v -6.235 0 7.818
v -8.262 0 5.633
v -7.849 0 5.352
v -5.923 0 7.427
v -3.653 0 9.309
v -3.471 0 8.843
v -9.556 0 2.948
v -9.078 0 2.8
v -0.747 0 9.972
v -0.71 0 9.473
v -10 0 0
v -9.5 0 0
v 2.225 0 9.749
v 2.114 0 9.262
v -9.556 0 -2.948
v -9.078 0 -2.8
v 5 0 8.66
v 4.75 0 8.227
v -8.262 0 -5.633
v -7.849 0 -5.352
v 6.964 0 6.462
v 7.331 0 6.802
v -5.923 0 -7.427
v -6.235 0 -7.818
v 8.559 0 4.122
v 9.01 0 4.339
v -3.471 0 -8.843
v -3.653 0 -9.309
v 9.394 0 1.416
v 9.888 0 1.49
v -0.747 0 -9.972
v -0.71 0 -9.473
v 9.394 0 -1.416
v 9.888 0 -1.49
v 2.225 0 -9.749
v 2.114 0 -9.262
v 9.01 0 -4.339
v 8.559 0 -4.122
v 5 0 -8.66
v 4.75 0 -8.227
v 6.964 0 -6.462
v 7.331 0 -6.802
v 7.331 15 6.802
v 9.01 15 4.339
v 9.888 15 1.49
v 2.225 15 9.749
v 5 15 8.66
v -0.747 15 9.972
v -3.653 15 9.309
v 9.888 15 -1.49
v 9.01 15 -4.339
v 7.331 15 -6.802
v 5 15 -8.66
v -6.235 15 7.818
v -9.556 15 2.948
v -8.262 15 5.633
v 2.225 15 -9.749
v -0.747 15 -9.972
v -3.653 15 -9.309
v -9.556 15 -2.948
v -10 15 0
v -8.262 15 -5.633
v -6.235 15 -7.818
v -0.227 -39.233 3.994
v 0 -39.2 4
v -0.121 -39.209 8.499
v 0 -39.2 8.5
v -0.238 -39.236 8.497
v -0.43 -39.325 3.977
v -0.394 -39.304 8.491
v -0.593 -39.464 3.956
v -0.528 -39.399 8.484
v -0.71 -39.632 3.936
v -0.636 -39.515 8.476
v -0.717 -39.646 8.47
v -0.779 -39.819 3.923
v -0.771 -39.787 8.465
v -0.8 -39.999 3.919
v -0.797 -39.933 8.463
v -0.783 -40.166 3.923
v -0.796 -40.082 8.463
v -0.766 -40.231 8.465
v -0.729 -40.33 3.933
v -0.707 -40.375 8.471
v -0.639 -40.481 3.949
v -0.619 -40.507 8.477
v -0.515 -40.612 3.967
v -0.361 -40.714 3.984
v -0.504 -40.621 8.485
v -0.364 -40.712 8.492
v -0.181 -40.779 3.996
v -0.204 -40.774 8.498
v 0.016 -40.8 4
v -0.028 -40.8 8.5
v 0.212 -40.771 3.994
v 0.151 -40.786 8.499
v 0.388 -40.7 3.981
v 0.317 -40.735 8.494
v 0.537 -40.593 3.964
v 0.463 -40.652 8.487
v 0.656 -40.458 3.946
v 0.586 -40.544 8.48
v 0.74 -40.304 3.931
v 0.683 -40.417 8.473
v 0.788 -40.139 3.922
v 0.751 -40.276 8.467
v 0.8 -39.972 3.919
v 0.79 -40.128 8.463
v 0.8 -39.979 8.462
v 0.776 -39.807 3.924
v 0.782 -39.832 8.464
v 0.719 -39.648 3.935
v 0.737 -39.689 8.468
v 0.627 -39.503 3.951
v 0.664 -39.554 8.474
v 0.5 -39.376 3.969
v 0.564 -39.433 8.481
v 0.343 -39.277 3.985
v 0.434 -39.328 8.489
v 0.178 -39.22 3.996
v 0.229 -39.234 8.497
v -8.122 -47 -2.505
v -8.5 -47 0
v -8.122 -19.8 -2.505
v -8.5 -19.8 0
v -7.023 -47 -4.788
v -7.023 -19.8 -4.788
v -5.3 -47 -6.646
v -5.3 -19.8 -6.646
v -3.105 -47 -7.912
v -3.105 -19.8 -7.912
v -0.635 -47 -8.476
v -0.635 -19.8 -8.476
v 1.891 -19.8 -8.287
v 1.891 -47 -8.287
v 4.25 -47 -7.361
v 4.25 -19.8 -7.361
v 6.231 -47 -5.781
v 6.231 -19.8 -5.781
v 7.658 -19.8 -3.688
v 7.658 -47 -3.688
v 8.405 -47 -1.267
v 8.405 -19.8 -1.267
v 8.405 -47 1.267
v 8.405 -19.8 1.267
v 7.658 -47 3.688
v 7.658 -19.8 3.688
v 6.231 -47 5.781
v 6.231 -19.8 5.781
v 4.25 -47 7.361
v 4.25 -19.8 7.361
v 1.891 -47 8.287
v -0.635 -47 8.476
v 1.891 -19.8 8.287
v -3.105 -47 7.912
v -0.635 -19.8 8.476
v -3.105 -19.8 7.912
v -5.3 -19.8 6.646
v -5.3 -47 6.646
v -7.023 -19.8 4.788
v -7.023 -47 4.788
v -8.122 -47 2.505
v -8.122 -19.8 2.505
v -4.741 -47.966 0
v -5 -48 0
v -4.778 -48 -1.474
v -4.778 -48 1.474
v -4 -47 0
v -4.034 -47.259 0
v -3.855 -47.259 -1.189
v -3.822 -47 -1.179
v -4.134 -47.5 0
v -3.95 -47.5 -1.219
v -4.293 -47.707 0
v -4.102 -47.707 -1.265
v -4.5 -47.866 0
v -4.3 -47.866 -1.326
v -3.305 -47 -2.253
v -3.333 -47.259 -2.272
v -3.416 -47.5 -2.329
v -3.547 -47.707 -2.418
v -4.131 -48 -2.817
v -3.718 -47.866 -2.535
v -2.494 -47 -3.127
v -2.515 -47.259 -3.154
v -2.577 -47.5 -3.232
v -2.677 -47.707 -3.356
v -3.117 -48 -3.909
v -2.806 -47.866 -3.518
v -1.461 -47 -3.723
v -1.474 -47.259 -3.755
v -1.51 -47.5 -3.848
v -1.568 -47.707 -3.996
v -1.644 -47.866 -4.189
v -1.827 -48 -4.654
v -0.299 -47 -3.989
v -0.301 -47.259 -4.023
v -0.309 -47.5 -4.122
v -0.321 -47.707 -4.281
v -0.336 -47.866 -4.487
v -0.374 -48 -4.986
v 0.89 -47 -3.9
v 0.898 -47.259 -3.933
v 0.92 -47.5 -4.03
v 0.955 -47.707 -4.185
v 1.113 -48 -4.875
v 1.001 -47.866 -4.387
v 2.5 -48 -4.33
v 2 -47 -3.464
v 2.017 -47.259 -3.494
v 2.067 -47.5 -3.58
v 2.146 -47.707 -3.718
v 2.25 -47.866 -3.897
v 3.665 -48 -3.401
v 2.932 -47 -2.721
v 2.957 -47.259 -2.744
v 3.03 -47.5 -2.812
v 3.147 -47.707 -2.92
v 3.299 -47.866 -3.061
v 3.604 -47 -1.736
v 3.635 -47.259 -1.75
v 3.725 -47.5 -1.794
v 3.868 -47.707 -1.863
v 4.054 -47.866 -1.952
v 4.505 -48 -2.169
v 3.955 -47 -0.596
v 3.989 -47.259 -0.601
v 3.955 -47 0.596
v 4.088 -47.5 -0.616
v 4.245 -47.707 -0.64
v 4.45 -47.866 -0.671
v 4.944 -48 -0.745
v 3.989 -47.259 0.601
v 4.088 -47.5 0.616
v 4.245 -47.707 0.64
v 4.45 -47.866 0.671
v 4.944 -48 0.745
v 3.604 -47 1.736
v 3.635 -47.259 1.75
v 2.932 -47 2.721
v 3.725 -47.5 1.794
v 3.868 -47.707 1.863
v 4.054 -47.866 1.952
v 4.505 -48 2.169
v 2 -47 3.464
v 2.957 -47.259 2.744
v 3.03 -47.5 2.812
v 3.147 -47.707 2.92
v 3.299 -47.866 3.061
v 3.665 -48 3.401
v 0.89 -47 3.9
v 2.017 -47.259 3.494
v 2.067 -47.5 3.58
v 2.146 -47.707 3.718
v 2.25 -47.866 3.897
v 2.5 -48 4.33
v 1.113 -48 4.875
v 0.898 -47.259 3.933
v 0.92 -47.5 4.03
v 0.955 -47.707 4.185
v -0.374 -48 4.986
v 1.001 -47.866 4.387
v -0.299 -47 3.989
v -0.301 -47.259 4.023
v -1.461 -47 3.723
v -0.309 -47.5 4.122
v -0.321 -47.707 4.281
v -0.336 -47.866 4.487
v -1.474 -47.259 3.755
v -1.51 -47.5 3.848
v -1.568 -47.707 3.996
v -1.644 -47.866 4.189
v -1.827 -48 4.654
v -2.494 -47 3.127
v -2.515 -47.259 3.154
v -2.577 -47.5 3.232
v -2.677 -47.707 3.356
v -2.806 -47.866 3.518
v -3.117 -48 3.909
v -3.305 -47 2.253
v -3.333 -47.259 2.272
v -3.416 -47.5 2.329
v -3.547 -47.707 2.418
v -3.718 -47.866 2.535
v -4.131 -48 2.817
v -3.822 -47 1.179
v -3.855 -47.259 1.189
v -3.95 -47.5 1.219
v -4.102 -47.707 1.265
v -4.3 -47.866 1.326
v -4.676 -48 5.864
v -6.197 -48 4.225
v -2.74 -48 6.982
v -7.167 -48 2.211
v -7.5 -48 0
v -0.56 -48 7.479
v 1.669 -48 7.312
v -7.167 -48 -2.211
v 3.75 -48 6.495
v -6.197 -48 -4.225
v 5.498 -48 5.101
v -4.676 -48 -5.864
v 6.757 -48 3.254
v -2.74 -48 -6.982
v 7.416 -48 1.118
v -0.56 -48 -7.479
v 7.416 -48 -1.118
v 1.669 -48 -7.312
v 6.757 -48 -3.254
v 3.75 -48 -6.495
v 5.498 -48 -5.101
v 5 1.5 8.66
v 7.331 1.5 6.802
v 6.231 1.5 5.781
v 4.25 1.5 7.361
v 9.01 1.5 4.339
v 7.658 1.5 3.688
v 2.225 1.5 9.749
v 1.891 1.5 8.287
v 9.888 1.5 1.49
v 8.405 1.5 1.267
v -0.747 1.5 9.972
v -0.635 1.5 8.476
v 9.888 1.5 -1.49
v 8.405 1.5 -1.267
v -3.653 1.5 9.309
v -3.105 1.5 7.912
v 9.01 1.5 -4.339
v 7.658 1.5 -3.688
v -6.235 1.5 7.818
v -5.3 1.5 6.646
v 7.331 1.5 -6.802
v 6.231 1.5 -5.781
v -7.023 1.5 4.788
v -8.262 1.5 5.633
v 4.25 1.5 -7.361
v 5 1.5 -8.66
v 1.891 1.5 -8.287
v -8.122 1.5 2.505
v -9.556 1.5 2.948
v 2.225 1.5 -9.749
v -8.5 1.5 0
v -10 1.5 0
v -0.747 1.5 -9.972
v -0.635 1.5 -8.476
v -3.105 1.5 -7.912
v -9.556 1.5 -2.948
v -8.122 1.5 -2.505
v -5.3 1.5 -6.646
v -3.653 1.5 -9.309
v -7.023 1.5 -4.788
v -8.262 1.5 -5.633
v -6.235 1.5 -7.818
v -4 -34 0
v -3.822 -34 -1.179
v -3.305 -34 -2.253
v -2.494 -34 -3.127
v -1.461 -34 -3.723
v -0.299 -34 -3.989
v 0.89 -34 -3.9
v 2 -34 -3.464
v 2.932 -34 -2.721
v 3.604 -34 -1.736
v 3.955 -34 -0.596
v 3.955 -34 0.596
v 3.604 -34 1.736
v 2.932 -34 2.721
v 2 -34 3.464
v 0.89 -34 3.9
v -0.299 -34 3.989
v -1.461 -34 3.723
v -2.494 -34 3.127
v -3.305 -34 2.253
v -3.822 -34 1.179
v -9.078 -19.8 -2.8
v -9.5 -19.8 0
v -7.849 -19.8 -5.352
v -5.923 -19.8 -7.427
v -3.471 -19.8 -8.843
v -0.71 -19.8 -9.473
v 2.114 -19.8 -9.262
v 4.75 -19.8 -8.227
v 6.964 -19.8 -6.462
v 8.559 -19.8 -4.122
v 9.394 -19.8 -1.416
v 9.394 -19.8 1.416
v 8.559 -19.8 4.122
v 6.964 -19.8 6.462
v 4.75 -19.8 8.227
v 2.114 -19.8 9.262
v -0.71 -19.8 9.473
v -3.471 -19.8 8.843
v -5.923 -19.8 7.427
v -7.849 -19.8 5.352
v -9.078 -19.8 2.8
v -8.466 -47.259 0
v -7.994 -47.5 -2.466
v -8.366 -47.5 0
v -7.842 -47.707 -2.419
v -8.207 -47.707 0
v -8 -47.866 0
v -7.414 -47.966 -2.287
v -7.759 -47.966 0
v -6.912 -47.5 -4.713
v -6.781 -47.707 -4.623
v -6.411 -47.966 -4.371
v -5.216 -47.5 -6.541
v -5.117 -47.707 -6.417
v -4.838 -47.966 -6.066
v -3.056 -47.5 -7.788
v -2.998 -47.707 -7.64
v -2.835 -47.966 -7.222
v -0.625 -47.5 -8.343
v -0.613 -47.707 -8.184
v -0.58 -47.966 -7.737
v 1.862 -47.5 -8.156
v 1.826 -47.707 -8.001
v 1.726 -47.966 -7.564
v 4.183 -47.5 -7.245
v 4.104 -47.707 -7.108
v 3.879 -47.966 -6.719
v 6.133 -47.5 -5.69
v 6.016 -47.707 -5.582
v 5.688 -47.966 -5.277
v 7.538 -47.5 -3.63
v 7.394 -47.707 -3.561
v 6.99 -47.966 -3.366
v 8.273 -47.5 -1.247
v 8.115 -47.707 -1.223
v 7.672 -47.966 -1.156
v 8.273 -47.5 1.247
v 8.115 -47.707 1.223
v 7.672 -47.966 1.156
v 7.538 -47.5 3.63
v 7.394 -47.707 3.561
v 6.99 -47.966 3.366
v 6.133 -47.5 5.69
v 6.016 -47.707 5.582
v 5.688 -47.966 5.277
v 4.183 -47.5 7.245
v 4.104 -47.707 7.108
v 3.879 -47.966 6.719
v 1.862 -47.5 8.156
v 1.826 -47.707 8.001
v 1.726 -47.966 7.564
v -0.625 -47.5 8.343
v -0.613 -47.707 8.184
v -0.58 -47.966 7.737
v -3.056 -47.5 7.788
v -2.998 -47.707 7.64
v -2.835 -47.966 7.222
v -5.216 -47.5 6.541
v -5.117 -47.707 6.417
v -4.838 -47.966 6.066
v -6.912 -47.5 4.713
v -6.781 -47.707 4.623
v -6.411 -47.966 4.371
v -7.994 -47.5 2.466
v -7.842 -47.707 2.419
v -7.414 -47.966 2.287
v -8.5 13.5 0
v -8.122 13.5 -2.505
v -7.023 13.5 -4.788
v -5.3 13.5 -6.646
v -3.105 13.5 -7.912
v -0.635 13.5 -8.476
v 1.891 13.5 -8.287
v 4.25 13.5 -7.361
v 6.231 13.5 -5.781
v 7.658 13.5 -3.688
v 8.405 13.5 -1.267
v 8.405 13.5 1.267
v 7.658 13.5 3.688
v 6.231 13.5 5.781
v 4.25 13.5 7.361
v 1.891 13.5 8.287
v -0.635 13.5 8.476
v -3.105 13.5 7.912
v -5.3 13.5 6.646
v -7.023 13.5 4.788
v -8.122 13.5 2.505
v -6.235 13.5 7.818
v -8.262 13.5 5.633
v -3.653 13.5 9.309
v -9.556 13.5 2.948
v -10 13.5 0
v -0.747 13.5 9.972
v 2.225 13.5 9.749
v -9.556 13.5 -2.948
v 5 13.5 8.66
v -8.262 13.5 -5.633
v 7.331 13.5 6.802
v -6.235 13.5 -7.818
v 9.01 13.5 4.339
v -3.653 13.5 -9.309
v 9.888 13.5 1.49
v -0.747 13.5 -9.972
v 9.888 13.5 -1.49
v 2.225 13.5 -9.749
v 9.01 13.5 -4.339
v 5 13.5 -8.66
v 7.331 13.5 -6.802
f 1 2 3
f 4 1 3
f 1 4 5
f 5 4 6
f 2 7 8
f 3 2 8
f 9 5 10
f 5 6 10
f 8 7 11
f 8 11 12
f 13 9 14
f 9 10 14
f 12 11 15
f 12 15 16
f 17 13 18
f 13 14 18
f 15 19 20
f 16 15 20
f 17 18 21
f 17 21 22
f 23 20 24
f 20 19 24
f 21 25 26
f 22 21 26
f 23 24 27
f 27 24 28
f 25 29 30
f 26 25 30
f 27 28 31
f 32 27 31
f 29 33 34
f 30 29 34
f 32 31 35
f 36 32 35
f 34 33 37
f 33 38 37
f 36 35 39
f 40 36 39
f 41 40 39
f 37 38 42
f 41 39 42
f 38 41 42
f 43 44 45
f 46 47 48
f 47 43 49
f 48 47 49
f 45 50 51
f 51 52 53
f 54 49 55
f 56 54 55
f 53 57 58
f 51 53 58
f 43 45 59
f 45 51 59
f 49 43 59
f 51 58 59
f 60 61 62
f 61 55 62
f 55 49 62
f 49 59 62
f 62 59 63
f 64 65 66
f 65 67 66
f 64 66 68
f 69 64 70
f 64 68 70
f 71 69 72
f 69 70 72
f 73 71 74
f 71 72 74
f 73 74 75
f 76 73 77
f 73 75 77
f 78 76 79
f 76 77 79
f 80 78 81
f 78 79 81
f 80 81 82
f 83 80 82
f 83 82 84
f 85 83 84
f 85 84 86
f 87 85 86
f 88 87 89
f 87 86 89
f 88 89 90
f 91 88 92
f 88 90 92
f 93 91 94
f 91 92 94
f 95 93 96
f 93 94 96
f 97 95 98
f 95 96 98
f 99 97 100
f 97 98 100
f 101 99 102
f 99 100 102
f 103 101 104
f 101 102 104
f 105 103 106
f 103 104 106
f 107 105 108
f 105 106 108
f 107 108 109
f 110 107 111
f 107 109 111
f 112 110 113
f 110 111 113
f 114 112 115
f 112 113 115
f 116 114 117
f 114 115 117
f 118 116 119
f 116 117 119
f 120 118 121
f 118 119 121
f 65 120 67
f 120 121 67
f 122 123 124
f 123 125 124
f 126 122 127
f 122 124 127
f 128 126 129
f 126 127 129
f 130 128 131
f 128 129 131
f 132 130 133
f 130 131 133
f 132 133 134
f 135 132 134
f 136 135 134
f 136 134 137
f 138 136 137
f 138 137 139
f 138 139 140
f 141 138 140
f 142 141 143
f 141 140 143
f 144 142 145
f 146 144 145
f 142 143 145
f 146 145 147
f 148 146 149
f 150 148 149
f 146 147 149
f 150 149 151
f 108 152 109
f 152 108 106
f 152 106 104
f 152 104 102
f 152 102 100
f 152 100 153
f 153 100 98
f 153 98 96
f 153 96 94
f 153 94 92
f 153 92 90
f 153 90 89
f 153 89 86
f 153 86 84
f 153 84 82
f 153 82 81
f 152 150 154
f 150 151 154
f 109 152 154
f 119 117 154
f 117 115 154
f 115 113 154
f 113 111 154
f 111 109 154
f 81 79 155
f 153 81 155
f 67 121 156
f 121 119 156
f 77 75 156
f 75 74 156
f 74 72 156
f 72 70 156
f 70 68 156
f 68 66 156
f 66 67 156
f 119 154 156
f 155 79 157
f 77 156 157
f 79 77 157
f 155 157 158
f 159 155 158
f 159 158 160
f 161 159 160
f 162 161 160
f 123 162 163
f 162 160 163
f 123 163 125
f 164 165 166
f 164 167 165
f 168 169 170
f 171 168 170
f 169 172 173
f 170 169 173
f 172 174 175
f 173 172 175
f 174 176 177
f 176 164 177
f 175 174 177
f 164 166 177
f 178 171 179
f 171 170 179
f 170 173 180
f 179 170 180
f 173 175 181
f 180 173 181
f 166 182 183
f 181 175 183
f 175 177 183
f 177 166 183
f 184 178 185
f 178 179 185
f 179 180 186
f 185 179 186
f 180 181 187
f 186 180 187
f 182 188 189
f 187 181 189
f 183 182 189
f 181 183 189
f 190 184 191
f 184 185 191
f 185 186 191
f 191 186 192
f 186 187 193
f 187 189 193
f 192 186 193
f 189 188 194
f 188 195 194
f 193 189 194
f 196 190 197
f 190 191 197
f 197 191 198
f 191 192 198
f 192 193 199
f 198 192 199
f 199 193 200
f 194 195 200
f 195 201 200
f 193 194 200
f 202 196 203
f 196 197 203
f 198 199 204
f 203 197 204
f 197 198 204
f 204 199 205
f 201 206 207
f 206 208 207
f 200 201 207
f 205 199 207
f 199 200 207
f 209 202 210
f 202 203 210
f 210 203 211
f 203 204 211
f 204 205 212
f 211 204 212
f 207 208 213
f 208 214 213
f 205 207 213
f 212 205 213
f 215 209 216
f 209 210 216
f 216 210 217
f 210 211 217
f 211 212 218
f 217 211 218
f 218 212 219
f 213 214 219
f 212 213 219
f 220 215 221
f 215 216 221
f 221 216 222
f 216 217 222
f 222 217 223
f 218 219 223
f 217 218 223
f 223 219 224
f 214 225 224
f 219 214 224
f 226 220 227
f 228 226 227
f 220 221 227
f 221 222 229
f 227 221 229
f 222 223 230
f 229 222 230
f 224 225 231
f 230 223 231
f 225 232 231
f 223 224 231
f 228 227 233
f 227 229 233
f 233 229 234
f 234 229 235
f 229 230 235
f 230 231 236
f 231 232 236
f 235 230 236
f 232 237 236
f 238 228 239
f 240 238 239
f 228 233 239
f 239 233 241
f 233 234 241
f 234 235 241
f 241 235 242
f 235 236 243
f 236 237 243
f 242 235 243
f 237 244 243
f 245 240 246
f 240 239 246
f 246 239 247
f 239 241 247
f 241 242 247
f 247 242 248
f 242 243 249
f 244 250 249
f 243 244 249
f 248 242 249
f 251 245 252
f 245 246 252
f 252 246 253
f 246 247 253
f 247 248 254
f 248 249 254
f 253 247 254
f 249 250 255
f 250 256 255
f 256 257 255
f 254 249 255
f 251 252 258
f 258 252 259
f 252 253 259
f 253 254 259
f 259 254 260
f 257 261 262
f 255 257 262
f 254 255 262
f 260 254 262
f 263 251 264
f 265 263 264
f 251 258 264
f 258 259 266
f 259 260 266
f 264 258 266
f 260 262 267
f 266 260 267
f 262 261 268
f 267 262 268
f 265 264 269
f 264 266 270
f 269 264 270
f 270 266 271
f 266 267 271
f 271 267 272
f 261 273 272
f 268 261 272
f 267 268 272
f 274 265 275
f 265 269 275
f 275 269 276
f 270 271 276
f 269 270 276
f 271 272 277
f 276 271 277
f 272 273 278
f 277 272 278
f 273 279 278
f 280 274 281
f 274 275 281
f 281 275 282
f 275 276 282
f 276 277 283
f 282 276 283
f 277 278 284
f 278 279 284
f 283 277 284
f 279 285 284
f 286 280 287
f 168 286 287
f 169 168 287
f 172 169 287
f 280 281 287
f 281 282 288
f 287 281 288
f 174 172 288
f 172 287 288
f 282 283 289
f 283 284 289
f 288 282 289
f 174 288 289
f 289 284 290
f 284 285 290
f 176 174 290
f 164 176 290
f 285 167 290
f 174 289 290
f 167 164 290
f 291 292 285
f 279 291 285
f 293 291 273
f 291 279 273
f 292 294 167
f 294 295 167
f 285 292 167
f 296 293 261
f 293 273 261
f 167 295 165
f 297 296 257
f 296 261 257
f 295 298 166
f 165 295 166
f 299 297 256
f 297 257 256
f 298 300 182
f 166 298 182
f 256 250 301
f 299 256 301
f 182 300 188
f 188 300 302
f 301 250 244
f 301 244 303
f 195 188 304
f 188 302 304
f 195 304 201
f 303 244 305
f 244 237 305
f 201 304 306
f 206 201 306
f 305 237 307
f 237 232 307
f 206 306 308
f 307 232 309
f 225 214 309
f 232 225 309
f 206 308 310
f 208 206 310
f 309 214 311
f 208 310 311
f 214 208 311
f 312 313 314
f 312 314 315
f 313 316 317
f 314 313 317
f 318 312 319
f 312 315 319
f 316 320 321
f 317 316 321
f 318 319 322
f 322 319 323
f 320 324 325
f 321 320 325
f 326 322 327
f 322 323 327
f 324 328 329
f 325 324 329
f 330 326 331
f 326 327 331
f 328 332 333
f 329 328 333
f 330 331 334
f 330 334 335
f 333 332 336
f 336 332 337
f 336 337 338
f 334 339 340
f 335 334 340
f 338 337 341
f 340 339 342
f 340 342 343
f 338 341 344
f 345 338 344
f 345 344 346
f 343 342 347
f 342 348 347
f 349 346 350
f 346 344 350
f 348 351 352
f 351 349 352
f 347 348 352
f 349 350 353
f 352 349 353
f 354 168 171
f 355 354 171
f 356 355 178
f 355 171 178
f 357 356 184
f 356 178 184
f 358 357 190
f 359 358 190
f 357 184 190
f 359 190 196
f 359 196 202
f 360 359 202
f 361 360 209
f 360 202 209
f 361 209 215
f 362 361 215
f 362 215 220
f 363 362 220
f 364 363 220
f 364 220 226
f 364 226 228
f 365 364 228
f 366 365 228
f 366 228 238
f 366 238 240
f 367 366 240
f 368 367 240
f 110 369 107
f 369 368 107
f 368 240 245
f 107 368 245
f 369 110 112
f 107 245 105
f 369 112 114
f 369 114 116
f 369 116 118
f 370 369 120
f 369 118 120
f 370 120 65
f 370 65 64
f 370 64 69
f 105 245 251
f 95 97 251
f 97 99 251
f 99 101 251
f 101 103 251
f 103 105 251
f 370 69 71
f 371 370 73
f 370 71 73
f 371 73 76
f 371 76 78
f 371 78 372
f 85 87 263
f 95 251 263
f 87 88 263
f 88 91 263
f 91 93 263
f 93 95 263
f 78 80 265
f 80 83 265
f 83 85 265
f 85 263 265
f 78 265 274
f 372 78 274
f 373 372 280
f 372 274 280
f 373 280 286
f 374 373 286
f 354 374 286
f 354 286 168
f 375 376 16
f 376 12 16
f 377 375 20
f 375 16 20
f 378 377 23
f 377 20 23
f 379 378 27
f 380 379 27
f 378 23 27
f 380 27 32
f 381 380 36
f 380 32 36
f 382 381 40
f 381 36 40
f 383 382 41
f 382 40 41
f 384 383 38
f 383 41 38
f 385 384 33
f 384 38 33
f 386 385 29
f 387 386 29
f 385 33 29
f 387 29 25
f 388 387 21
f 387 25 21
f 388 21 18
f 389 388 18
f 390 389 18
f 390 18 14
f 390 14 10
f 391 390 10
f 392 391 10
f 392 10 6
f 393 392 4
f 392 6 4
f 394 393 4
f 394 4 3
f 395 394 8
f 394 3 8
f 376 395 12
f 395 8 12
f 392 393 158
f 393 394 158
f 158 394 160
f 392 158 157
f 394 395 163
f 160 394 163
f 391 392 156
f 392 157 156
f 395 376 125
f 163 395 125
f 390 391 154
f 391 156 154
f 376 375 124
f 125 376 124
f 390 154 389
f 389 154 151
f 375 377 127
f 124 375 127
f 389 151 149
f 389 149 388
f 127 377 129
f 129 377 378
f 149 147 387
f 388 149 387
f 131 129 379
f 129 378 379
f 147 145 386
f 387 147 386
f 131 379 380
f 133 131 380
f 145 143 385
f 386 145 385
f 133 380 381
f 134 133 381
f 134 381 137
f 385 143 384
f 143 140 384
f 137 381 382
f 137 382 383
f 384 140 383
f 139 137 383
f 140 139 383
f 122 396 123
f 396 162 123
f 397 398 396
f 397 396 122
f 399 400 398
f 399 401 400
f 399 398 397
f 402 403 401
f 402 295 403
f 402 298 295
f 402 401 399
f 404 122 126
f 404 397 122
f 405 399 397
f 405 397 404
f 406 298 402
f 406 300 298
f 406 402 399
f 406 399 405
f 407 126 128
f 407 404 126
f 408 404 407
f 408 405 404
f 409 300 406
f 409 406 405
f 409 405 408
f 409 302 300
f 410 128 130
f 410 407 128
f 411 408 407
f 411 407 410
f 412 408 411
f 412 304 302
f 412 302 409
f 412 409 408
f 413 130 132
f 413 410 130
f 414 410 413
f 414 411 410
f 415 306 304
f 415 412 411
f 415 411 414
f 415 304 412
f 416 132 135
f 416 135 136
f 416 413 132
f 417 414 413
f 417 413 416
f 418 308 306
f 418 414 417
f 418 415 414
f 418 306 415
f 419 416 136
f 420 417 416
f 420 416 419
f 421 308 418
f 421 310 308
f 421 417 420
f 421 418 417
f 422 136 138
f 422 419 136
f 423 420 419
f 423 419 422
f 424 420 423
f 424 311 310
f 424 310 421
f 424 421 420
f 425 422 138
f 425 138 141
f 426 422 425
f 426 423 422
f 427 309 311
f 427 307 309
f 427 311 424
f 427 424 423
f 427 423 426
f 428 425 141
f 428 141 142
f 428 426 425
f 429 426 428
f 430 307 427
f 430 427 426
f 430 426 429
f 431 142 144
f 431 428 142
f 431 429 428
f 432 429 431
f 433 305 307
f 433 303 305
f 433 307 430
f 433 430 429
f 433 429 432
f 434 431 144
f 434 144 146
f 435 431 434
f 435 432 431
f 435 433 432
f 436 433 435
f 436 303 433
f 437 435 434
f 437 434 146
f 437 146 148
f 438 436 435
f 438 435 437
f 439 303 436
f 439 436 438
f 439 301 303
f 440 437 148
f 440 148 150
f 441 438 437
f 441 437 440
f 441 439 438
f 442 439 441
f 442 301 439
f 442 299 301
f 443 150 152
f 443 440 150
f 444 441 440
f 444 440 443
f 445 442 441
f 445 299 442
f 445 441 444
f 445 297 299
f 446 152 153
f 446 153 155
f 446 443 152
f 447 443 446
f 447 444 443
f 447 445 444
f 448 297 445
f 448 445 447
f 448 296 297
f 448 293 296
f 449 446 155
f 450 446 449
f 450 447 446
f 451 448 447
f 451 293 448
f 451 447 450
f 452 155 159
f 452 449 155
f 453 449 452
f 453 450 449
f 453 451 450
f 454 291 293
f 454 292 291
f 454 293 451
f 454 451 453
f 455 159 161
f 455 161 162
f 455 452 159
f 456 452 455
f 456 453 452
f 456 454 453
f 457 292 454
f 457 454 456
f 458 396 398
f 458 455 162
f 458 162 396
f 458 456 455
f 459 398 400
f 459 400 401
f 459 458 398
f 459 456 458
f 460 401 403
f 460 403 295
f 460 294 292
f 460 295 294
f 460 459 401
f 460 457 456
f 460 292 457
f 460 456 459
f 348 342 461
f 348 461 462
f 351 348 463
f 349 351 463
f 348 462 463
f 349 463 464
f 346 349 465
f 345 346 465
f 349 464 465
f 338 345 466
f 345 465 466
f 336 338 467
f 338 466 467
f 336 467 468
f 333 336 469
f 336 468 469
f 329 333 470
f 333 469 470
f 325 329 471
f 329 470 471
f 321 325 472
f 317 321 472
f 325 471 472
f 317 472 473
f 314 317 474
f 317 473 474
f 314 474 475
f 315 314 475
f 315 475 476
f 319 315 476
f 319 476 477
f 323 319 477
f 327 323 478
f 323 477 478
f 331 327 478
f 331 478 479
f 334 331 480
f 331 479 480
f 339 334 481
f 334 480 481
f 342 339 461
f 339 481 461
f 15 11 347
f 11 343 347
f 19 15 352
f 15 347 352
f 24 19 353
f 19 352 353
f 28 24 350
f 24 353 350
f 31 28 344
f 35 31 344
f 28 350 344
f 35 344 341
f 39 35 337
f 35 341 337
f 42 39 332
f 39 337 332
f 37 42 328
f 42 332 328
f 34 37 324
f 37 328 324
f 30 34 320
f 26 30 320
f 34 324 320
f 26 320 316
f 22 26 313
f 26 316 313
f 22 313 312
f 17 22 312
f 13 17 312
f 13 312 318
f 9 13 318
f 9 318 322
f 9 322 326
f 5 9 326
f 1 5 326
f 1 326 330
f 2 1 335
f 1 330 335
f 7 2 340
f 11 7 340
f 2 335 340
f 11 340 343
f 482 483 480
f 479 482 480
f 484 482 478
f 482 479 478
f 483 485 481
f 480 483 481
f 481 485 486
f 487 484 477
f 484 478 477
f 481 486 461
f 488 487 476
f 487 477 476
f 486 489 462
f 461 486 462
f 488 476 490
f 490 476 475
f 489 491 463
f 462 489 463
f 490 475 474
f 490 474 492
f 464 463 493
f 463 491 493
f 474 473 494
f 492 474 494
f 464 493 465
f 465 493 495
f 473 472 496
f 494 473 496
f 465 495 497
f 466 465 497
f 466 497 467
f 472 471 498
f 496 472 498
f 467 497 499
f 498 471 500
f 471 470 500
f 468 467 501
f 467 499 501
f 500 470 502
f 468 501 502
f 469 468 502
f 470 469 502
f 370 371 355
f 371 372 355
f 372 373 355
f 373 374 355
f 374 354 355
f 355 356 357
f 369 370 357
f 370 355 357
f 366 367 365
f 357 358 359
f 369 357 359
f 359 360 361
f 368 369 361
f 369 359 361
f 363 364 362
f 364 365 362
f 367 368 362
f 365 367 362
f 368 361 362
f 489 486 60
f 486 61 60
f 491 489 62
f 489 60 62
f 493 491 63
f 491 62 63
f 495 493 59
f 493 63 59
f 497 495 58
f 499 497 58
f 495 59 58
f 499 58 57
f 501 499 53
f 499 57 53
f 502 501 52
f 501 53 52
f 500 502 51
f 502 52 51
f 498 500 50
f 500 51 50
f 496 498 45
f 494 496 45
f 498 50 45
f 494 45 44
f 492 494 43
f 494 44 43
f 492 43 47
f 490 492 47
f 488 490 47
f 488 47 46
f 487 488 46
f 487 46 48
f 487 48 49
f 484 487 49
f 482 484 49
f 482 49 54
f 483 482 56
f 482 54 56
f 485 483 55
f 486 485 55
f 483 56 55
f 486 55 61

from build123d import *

# Parameters (mm, degrees)
FILLET1_R = 1
SKETCH3_W = 0.8
SKETCH3_H = 8.5


with BuildPart() as part:
    # Sketch1 → Revolve1 (revolve)
    with BuildSketch(Plane.XY):
        Polygon((-8.5, -48), (-8.5, -19.8), (-9.5, -19.8), (-9.5, 0), (-10, 0), (-10, 1.5), (-8.5, 1.5), (-8.5, 13.5), (-10, 13.5), (-10, 15), (0, 15), (0, -34), (-4, -34), (-4, -48), align=None)
    revolve(axis=Axis((0, 15, 0), (0, -1, 0)))

    # Fillet1
    fillet1_edges = [part.edges().sort_by_distance(p)[0] for p in [
        (8.5, -48, 0),
        (4, -48, 0),
    ]]
    fillet(fillet1_edges, radius=FILLET1_R)

    # Sketch3 → M2x0.4 Tapped Hole1 (revolve, cut)
    with BuildSketch(Plane(origin=(0, -40, 0), x_dir=(0, 1, 0), z_dir=(1, 0, 0))):
        with Locations((0.4, 4.25)):
            Rectangle(SKETCH3_W, SKETCH3_H)
    revolve(axis=Axis((0, -40, -6.35), (0, 0, 1)), mode=Mode.SUBTRACT)


solid = part.part
